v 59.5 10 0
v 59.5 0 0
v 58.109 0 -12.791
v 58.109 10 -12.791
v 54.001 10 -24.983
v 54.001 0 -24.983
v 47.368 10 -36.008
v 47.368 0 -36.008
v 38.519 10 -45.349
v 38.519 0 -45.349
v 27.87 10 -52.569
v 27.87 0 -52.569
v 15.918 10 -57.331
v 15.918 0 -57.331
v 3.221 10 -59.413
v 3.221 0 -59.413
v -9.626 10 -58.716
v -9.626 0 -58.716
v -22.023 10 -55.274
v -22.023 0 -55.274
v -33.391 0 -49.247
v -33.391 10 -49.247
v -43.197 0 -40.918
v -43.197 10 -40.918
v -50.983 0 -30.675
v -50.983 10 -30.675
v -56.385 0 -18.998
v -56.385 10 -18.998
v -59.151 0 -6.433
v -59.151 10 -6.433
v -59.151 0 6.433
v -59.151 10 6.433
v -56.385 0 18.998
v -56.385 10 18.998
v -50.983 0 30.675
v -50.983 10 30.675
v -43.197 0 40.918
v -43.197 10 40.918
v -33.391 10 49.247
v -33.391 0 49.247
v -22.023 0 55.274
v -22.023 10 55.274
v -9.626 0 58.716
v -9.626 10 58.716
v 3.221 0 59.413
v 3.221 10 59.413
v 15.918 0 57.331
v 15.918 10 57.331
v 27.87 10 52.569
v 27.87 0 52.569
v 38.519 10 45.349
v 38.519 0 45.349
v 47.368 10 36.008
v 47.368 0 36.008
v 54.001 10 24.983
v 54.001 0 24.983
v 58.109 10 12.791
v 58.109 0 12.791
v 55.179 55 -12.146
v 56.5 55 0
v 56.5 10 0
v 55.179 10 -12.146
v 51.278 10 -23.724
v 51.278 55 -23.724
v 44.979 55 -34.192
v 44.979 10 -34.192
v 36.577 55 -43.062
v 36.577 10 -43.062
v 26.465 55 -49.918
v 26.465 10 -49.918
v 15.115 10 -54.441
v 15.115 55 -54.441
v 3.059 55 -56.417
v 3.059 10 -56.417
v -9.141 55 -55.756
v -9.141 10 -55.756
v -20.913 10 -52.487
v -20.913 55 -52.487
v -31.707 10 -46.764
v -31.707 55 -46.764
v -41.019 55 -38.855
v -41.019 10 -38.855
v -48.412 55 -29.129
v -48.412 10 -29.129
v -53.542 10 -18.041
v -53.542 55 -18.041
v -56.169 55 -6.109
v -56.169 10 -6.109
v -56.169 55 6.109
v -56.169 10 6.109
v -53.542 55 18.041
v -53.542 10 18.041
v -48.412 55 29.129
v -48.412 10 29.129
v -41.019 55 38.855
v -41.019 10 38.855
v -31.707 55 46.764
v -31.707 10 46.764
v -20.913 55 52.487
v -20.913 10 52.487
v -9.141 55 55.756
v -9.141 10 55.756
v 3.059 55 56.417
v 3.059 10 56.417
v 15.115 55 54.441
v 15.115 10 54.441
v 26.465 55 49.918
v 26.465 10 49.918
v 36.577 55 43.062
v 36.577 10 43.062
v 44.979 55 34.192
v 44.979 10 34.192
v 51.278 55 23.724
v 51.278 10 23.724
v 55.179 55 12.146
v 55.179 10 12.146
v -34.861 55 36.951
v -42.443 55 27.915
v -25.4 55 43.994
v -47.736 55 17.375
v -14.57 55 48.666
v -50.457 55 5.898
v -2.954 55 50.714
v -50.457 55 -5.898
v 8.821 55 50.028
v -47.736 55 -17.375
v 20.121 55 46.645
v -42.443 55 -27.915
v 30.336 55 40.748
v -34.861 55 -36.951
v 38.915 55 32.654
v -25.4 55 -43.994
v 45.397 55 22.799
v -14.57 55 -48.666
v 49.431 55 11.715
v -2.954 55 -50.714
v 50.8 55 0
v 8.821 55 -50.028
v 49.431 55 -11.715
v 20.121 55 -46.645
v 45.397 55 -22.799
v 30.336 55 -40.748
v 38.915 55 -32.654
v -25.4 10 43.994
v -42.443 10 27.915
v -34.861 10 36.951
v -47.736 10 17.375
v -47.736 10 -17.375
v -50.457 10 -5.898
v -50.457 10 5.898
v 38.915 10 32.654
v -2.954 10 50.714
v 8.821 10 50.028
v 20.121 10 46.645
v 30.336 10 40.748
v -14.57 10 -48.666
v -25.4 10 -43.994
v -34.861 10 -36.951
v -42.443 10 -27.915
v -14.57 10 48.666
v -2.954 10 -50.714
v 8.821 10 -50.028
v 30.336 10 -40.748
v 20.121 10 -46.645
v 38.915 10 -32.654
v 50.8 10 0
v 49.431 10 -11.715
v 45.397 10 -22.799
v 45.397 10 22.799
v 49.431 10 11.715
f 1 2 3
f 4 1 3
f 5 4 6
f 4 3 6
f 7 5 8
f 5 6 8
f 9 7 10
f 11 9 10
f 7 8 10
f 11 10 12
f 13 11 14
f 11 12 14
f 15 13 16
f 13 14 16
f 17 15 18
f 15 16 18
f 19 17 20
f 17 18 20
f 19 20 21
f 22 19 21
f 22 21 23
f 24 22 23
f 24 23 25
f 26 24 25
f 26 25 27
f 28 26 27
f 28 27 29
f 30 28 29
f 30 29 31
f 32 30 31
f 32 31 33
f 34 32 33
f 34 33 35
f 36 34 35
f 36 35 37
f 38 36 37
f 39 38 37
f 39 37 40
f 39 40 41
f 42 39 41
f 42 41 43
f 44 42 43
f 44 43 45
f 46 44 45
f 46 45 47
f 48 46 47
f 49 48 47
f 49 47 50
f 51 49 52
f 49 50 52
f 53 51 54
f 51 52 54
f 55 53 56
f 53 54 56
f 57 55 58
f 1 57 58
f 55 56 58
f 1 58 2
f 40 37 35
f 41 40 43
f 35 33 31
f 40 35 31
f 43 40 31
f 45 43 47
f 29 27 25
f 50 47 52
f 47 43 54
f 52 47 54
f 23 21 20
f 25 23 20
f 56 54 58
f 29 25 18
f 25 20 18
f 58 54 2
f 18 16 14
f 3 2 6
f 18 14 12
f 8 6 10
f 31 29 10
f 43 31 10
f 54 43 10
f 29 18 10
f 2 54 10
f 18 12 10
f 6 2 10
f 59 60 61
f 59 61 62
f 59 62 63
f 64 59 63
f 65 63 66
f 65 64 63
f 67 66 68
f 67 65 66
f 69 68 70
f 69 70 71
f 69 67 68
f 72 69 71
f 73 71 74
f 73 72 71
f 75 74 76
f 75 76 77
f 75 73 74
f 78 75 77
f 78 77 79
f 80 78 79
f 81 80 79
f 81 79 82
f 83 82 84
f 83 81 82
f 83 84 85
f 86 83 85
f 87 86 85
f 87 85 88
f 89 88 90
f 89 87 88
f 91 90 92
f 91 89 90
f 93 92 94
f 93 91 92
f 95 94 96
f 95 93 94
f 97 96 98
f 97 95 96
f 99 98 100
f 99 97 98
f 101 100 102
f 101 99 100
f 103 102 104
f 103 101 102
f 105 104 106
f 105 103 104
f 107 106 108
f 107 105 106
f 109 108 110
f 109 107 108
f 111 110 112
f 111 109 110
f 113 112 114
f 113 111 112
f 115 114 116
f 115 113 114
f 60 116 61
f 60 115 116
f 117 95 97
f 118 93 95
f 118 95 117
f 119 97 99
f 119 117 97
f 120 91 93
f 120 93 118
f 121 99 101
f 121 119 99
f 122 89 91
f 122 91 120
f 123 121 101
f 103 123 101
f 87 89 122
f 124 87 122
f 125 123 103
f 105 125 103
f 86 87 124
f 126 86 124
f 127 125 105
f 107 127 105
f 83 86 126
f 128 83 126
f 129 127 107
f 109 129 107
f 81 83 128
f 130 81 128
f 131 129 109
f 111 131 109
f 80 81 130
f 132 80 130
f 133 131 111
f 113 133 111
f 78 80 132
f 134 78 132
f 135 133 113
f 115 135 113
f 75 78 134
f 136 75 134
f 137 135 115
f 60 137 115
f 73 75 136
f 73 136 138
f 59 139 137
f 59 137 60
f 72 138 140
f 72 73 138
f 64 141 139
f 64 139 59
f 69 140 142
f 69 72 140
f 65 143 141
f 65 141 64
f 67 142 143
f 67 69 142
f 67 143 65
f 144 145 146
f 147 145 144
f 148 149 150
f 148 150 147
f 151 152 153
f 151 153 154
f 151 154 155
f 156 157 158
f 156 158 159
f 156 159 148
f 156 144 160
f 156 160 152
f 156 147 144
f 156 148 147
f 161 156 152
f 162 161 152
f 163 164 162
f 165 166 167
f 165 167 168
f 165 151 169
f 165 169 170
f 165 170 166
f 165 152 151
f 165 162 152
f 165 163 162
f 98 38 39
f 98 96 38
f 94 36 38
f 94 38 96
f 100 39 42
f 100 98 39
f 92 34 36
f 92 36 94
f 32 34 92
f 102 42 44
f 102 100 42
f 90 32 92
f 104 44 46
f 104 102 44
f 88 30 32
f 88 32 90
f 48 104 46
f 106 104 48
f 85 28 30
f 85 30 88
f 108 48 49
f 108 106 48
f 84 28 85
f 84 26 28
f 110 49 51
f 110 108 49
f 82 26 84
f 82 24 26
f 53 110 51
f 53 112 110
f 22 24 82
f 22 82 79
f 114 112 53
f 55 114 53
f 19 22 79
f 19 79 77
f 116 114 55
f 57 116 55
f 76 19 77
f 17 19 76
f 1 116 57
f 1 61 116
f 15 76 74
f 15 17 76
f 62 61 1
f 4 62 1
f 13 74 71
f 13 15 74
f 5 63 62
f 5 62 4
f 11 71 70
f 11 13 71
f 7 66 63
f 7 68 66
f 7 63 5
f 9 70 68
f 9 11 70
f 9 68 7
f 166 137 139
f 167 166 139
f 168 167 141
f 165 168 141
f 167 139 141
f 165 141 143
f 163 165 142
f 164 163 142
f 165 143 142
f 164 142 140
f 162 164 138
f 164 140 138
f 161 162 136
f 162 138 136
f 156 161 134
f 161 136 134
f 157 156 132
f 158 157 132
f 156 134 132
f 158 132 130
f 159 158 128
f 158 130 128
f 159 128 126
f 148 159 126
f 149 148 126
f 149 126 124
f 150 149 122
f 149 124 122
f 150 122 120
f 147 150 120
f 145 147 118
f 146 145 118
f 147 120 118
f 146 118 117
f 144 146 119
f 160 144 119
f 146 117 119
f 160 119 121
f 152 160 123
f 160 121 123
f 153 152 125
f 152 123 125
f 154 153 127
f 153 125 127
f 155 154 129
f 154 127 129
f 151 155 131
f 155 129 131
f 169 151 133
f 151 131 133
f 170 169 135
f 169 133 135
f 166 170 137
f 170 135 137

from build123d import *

# Parameters (mm, degrees)
ESBO_O1_R                = 59.5
RESSALTO_EXTRUS_O1_DEPTH = 55
ESBO_O2_R                = 50.8
CORTE_EXTRUS_O1_DEPTH    = 45
ESBO_O3_R                = 59.5
ESBO_O3_R_2              = 56.5
CORTE_EXTRUS_O2_DEPTH    = 45


with BuildPart() as part:
    # Esboço1 → Ressalto-extrusão1 (new body)
    with BuildSketch(Plane(origin=(0, 0, 0), x_dir=(1, 0, 0), z_dir=(0, 1, 0))):
        Circle(ESBO_O1_R)
    extrude(amount=RESSALTO_EXTRUS_O1_DEPTH)

    # Esboço2 → Corte-extrusão1 (cut)
    with BuildSketch(Plane(origin=(0, 55, 0), x_dir=(1, 0, 0), z_dir=(0, 1, 0))):
        Circle(ESBO_O2_R)
    extrude(amount=-CORTE_EXTRUS_O1_DEPTH, mode=Mode.SUBTRACT)

    # Esboço3 → Corte-extrusão2 (cut)
    with BuildSketch(Plane(origin=(0, 55, 0), x_dir=(1, 0, 0), z_dir=(0, 1, 0))):
        Circle(ESBO_O3_R)
        Circle(ESBO_O3_R_2, mode=Mode.SUBTRACT)
    extrude(amount=-CORTE_EXTRUS_O2_DEPTH, mode=Mode.SUBTRACT)


solid = part.part
